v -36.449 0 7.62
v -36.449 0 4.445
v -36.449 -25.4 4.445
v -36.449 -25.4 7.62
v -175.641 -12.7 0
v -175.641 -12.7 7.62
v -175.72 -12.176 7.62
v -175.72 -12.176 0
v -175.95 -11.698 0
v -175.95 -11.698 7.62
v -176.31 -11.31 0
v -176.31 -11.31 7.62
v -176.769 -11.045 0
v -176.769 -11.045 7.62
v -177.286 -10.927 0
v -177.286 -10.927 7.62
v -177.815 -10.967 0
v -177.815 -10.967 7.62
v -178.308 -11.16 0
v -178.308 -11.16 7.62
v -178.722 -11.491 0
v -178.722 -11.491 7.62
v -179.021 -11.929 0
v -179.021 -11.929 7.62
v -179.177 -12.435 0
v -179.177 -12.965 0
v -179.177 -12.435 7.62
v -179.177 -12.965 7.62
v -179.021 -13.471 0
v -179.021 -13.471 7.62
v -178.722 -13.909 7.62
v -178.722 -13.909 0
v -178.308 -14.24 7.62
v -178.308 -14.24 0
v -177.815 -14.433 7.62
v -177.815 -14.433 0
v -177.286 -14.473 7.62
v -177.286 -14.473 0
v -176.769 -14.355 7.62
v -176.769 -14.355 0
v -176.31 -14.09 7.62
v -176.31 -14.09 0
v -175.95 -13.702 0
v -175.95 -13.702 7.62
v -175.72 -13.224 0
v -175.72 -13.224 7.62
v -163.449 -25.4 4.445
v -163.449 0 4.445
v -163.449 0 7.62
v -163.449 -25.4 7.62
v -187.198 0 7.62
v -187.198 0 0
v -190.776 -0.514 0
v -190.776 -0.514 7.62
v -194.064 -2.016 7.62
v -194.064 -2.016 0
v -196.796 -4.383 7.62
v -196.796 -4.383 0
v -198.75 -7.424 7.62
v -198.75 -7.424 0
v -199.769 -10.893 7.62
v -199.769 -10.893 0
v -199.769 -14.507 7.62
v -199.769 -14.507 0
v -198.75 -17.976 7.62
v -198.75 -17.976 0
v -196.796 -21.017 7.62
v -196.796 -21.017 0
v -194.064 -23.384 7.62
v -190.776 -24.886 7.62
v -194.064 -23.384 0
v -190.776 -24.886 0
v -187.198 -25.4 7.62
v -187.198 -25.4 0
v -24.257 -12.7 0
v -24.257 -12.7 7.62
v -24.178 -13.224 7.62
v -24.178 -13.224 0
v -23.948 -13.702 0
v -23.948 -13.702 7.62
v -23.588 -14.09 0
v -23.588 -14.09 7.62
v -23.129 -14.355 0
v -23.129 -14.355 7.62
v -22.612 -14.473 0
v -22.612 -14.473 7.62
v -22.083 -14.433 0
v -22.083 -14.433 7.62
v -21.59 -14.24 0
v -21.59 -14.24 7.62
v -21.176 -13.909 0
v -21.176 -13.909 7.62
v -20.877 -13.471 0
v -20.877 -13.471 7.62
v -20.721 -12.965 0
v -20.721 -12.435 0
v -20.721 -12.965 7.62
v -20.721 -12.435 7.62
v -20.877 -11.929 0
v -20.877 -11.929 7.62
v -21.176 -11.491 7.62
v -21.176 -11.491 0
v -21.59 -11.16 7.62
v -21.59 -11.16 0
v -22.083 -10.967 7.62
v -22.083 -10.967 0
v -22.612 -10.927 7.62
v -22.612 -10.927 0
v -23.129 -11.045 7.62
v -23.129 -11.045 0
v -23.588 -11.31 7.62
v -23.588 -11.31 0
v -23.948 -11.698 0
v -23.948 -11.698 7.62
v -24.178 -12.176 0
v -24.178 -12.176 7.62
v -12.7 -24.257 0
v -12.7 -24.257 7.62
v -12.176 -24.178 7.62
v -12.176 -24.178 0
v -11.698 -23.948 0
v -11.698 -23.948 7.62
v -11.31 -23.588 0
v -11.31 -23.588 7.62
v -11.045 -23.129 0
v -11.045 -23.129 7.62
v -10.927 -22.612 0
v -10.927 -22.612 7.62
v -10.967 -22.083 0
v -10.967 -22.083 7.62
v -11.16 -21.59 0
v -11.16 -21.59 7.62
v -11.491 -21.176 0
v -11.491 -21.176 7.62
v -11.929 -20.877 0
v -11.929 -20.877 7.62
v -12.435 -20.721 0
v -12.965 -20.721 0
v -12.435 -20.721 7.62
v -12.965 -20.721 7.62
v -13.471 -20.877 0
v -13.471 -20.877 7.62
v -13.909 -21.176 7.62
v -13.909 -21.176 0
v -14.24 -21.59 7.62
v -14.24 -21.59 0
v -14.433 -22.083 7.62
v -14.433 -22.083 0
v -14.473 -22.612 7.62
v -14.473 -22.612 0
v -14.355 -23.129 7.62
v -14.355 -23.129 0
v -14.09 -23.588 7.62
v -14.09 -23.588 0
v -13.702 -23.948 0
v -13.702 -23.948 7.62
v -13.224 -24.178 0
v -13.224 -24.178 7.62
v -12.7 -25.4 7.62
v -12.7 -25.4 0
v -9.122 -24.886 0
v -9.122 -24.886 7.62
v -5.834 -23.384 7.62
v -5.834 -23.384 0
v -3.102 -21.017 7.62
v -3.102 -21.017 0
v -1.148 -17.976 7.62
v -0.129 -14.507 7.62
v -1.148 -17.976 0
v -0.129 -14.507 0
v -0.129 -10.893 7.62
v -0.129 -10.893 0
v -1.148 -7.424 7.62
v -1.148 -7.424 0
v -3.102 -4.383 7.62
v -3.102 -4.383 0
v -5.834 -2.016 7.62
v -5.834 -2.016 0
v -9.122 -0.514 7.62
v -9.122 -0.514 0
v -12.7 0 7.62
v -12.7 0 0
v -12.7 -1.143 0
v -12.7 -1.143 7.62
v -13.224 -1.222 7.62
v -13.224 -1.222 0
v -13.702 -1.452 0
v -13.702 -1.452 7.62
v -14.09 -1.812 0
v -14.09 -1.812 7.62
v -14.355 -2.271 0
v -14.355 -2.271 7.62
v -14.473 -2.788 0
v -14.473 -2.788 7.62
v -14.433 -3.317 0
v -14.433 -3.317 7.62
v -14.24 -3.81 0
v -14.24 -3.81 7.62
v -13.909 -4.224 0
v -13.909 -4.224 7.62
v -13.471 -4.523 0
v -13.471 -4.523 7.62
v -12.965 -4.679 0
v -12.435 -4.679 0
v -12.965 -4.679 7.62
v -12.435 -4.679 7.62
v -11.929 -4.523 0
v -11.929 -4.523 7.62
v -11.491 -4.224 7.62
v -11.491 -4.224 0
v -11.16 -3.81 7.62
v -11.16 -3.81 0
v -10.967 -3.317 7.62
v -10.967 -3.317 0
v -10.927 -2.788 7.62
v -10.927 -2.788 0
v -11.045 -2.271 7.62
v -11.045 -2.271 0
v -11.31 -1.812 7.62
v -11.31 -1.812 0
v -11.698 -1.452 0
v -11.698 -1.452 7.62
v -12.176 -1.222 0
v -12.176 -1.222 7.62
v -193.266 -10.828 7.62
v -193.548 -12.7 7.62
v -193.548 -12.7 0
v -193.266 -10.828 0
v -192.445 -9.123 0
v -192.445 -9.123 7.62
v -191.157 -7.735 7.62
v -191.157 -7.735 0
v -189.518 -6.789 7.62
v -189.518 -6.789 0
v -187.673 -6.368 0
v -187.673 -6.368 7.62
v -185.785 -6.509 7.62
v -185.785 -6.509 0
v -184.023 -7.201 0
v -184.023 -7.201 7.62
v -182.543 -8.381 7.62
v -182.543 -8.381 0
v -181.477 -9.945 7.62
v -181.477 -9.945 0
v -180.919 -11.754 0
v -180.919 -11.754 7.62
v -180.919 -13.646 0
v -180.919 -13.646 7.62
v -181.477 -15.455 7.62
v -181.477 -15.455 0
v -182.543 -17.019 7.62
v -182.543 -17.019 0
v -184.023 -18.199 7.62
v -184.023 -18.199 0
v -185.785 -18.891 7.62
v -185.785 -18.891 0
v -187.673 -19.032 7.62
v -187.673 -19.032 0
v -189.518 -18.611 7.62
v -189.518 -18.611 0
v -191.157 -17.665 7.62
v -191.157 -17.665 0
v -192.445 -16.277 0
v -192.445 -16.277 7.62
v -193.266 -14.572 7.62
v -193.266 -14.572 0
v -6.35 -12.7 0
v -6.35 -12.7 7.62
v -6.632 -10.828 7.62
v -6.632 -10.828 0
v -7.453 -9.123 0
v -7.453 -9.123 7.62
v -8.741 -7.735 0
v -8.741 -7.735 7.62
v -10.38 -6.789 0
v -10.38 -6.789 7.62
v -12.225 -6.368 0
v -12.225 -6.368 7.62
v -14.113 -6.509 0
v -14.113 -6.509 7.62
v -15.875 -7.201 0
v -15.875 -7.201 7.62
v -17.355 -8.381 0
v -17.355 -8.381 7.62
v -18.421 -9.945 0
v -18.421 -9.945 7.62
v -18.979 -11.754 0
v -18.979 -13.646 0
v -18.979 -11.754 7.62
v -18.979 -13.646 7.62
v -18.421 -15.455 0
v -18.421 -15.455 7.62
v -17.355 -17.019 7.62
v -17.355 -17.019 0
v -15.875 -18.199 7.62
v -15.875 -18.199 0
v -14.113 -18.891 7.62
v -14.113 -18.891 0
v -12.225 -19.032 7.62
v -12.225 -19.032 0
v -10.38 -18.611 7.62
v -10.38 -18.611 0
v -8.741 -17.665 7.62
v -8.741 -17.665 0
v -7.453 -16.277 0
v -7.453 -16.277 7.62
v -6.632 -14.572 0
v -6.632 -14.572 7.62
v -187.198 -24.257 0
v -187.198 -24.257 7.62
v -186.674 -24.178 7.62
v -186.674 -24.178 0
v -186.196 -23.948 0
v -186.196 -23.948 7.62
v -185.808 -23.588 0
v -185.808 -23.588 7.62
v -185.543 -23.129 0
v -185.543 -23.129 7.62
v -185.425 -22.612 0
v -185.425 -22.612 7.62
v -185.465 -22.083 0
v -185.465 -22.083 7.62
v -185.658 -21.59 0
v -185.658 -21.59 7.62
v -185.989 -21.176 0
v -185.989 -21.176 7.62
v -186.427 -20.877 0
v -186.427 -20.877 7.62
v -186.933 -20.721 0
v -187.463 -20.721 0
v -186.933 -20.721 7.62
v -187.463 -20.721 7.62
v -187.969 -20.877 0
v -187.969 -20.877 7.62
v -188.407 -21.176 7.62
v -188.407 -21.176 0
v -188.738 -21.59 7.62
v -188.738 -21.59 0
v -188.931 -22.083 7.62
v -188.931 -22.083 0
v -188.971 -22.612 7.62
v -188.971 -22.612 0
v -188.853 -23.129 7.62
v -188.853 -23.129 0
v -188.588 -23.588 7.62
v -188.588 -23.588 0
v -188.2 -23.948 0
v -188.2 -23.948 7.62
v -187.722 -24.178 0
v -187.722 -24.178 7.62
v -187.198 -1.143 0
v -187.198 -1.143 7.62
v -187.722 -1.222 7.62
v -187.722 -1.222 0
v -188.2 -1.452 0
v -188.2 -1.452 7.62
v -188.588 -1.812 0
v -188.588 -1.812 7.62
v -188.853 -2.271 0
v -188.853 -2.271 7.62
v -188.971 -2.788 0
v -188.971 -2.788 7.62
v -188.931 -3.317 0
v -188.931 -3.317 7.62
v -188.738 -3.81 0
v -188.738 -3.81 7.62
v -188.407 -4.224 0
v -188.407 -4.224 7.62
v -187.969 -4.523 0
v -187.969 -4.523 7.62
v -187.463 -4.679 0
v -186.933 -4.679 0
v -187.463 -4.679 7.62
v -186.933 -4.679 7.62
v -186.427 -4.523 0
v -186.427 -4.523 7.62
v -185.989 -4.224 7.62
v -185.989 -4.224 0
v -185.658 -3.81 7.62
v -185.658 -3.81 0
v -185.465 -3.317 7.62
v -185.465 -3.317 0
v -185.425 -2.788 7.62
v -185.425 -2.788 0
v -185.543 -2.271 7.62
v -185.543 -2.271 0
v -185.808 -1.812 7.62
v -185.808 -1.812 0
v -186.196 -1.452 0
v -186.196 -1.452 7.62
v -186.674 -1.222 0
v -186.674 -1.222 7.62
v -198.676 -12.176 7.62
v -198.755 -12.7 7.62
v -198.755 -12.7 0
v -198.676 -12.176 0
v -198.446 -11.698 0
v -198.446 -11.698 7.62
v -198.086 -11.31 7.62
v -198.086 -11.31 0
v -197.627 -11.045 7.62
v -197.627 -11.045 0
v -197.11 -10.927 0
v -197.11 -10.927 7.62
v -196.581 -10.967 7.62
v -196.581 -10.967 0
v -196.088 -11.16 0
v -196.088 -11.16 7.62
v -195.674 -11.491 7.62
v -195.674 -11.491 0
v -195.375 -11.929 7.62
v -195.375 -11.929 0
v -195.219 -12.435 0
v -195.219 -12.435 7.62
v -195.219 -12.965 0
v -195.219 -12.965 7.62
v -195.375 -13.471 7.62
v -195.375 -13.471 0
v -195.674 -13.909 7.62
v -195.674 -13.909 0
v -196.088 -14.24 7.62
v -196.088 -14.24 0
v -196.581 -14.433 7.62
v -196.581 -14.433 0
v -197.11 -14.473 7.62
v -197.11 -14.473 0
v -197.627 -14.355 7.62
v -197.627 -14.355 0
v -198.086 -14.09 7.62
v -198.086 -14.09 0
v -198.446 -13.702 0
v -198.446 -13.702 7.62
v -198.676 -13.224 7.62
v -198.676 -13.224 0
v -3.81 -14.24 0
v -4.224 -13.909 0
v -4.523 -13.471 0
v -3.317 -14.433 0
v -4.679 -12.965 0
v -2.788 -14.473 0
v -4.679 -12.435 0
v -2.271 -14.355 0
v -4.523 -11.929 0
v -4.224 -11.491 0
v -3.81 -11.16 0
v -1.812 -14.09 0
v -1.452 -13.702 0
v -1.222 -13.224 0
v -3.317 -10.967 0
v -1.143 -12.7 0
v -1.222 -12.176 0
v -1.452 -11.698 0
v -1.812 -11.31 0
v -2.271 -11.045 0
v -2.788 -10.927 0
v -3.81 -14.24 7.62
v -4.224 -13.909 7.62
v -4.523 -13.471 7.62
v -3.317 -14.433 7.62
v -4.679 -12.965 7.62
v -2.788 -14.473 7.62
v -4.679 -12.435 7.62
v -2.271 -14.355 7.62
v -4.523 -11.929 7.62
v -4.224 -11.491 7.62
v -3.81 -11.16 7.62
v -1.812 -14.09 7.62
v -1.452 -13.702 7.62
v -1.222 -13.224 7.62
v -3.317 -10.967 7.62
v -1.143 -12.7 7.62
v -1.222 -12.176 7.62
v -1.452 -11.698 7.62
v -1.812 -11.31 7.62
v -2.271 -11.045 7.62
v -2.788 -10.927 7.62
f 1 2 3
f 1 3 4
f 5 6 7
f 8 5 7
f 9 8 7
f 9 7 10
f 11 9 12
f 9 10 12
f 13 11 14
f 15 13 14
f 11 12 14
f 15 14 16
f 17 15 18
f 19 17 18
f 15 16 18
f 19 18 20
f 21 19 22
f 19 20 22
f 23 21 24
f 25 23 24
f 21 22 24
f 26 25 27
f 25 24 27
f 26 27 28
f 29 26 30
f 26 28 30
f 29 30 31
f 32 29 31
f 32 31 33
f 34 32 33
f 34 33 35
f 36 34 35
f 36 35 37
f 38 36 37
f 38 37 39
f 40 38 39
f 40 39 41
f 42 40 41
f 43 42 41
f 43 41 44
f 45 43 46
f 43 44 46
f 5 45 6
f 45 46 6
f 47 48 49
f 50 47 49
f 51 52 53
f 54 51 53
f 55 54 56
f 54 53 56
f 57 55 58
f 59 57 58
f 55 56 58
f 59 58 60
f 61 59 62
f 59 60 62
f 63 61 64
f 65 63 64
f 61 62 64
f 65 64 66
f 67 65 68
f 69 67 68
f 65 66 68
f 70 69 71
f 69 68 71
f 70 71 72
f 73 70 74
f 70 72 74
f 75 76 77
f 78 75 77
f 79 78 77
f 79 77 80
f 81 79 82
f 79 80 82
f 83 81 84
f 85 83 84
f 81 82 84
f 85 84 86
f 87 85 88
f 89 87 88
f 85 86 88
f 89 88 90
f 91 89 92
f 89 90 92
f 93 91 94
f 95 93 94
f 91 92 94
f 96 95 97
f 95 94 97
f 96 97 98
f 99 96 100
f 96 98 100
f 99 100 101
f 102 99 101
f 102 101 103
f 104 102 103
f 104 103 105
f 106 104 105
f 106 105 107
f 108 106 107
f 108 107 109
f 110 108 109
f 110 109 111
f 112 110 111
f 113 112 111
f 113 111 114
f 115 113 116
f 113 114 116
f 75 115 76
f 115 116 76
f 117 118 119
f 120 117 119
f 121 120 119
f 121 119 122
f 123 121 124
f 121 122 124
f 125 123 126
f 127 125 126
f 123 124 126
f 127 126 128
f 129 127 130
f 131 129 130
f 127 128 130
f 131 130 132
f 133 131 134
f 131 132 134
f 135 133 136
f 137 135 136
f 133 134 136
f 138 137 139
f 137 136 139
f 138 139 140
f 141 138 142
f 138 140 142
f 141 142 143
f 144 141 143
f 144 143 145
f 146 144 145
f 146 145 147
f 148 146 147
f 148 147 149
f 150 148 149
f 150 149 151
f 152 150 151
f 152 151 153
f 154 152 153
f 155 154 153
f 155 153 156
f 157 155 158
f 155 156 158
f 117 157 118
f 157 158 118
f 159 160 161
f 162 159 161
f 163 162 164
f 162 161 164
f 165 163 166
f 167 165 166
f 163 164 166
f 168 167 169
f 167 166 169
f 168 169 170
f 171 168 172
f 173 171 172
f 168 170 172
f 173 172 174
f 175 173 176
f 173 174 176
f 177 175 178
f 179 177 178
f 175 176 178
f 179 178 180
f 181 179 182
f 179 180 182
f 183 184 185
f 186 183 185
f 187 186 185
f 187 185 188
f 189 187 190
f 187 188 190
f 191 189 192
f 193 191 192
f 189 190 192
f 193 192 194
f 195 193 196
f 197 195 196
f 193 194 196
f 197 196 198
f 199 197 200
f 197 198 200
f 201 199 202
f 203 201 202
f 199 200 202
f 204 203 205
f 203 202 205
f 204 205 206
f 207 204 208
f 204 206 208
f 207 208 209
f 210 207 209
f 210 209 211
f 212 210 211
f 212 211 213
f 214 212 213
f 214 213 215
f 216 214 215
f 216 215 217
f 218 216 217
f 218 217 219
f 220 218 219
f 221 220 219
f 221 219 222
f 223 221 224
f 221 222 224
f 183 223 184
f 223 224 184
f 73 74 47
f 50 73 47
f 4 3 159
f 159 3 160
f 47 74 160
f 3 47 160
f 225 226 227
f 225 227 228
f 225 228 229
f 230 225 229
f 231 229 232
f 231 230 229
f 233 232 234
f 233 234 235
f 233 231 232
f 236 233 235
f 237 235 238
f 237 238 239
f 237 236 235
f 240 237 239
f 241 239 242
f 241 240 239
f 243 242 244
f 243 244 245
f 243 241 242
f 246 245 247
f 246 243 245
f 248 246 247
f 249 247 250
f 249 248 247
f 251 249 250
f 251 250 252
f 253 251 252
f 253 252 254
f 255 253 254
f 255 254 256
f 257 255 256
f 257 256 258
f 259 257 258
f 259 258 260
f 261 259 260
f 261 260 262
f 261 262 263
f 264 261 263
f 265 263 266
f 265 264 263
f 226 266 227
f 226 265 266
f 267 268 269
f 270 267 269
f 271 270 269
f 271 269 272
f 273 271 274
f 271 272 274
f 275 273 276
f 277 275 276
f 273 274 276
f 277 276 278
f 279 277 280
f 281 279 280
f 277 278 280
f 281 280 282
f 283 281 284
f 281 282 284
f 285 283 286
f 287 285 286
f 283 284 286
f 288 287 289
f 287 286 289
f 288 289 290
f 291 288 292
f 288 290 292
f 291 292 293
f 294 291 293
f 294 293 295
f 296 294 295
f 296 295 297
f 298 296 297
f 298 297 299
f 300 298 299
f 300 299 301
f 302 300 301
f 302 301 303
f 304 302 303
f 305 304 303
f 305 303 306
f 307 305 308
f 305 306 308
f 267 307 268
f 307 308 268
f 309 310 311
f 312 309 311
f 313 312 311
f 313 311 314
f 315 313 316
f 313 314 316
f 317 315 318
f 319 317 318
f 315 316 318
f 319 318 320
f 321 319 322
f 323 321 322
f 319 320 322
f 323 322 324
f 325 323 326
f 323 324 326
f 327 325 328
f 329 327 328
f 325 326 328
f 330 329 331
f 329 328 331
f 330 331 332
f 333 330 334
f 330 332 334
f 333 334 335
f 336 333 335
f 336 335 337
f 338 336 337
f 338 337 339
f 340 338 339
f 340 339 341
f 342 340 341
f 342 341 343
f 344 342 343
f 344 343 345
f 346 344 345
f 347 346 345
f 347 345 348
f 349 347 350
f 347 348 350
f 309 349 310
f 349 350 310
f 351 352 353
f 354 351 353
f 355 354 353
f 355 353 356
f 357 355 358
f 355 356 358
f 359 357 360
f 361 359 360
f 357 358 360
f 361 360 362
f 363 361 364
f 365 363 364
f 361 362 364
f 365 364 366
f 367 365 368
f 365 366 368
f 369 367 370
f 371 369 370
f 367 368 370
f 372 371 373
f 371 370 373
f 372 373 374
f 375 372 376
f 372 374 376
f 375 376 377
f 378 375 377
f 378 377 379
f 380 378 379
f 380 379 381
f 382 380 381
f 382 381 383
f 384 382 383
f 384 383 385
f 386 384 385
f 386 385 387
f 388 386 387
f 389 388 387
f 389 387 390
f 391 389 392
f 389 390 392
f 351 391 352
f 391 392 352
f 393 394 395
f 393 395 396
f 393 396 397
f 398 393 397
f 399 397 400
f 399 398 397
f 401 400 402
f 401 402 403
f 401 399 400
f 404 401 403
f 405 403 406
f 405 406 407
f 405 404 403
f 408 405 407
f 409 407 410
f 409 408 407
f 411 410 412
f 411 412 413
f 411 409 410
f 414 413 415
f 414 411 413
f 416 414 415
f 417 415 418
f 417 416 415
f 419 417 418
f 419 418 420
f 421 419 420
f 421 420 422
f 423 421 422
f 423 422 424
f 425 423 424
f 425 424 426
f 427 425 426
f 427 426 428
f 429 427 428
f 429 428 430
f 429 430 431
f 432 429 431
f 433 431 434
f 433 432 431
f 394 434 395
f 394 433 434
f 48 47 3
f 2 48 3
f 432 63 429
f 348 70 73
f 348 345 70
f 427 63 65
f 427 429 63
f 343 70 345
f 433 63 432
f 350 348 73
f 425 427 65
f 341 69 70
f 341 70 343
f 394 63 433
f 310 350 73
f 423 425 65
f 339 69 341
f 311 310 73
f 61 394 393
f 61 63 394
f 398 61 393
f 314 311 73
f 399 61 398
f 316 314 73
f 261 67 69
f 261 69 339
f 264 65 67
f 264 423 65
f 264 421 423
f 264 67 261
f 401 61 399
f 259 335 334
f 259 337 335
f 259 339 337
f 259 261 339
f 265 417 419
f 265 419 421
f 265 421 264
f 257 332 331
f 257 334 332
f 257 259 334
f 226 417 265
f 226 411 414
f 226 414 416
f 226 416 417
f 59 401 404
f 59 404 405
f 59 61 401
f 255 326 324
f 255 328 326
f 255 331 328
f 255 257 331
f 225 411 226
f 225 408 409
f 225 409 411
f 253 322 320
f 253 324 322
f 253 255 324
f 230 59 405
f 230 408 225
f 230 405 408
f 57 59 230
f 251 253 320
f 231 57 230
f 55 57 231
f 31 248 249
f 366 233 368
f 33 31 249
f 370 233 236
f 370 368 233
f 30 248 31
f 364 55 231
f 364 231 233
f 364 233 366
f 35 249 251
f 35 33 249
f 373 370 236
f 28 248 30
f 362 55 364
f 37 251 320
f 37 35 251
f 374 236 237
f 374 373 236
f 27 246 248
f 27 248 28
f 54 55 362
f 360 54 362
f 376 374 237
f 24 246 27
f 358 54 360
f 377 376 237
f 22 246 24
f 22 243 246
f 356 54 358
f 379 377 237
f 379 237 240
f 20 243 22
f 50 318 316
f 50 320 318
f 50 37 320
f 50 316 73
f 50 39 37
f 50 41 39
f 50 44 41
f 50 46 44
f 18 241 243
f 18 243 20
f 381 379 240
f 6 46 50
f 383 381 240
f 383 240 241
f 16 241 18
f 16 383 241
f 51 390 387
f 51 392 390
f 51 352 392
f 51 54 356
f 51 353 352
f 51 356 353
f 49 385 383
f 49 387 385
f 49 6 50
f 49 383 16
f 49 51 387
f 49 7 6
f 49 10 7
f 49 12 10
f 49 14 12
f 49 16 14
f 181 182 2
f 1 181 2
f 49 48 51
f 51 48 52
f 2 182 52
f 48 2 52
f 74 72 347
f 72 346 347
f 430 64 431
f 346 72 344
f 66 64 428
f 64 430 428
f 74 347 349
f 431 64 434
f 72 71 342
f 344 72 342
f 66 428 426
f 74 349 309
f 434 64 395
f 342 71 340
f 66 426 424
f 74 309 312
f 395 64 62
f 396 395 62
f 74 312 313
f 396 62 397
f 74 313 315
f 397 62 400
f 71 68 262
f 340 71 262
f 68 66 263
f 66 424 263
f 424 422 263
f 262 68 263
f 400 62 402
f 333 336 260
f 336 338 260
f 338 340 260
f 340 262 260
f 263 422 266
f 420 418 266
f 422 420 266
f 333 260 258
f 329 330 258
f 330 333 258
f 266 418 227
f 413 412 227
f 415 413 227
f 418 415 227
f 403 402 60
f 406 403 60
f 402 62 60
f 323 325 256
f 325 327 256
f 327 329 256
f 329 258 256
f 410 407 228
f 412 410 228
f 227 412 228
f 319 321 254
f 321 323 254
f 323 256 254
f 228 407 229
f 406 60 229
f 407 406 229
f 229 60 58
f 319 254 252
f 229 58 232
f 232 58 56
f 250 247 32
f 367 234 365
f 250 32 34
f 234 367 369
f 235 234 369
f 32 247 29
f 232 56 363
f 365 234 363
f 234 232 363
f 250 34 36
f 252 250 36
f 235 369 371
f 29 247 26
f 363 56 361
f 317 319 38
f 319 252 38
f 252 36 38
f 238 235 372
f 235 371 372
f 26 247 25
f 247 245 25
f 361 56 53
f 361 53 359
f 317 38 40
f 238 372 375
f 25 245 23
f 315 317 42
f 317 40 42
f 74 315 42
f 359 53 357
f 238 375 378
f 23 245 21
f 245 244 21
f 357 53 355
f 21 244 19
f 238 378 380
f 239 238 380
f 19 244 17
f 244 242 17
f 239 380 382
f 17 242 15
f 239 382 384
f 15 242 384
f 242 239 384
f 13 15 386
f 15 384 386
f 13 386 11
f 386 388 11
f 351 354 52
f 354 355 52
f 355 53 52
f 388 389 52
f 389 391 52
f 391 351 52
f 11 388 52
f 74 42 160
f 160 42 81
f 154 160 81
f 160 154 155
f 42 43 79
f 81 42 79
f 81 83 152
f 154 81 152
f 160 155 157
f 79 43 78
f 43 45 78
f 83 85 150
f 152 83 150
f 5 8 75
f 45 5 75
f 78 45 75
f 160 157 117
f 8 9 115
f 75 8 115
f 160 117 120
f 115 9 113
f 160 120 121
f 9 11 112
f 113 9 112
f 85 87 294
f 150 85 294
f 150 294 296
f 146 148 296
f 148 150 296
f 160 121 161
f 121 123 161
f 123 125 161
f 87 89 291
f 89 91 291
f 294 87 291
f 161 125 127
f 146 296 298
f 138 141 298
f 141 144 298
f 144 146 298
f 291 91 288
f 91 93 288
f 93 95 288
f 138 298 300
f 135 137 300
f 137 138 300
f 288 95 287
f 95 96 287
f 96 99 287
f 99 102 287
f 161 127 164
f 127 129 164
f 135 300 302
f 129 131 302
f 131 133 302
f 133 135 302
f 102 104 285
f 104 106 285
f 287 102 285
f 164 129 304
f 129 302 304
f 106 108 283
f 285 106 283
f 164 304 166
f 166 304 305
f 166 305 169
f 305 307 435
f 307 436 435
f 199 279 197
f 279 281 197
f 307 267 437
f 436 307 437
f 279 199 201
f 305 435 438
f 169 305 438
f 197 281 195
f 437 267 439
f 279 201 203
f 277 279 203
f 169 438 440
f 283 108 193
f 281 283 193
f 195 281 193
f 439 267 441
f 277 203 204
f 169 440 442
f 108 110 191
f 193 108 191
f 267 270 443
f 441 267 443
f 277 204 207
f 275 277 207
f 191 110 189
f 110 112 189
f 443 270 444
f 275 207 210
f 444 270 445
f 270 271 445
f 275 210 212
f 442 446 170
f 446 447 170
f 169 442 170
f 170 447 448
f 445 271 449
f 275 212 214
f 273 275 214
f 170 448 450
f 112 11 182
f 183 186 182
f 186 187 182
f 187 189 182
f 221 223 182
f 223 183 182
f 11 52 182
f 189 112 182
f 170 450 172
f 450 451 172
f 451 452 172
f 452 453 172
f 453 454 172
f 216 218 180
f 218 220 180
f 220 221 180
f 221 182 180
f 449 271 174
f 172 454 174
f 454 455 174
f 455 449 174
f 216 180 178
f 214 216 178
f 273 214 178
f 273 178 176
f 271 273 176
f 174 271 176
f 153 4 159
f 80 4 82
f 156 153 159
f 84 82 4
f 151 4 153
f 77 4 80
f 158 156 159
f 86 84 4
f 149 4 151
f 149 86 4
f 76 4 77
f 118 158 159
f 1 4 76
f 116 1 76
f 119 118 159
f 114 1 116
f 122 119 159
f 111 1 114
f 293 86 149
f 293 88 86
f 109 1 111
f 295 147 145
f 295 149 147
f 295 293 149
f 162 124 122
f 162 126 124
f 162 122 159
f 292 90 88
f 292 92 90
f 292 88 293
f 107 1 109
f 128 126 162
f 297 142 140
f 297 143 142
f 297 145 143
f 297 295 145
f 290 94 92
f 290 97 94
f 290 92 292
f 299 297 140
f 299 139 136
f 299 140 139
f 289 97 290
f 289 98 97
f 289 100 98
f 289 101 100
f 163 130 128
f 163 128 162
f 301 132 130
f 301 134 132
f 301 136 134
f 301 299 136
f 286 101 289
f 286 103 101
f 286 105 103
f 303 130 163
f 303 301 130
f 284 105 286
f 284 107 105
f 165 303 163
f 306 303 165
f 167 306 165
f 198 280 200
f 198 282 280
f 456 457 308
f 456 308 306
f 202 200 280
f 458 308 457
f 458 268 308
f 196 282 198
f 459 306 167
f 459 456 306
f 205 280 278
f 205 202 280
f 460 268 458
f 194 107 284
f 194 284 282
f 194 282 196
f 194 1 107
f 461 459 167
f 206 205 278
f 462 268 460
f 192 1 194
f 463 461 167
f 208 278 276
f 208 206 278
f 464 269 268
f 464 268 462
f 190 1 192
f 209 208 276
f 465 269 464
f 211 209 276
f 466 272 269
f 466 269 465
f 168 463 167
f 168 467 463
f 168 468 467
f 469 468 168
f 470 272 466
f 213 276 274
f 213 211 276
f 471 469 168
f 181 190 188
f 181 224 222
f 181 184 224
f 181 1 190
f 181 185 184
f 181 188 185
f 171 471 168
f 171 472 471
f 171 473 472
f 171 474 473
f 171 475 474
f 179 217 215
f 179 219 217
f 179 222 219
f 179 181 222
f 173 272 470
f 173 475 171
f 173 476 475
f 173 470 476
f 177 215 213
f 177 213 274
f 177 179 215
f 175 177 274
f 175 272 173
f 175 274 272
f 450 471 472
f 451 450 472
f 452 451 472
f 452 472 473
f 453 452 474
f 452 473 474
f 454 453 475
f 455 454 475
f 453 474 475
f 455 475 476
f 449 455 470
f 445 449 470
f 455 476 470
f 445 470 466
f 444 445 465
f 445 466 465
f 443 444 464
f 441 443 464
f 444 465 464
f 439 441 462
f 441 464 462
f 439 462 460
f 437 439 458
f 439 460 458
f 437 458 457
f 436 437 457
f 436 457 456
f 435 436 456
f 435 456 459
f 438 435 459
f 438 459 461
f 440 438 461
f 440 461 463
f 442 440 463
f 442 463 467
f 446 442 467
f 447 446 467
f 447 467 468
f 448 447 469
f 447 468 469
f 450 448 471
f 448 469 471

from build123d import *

# Parameters (mm, degrees)
SKETCH1_R               = 12.7
BOSS_EXTRUDE1_DEPTH     = 7.62
SKETCH2_R               = 6.35
CUT_EXTRUDE1_DEPTH      = 7.62
SKETCH3_R               = 1.778
CUT_EXTRUDE2_DEPTH      = 7.62
CIRPATTERN1_COUNT       = 4
MIRROR1_COPY_1_SKETCH_R = 1.778
MIRROR1_COPY_1_DEPTH    = 7.62
MIRROR1_COPY_2_SKETCH_R = 1.778
MIRROR1_COPY_2_DEPTH    = 7.62
MIRROR1_COPY_3_SKETCH_R = 1.778
MIRROR1_COPY_3_DEPTH    = 7.62
SKETCH4_W               = 127
SKETCH4_H               = 3.175
CUT_EXTRUDE3_DEPTH      = 25.4


with BuildPart() as part:
    # Sketch1 → Boss-Extrude1 (new body)
    with BuildSketch(Plane.XY):
        with BuildLine():
            ThreePointArc((-12.7, -25.4), (-25.4, -12.7), (-12.7, 0))
            Line((-12.7, 0), (-187.198, 0))
            ThreePointArc((-187.198, 0), (-178.217743879, -3.719743879), (-174.498, -12.7))
            ThreePointArc((-174.498, -12.7), (-178.217743879, -21.680256121), (-187.198, -25.4))
            Line((-187.198, -25.4), (-12.7, -25.4))
        make_face()
        with Locations((-187.198, -12.7)):
            Circle(SKETCH1_R)
        with Locations((-12.7, -12.7)):
            Circle(SKETCH1_R)
    extrude(amount=BOSS_EXTRUDE1_DEPTH)

    # Sketch2 → Cut-Extrude1 (cut)
    with BuildSketch(Plane.XY.offset(7.62)):
        with Locations((-12.7, -12.7)):
            Circle(SKETCH2_R)
    cut_extrude1 = extrude(amount=-CUT_EXTRUDE1_DEPTH, mode=Mode.SUBTRACT)

    # Sketch3 → Cut-Extrude2 (cut)
    with BuildSketch(Plane.XY.offset(7.62)):
        with Locations((-2.921, -12.7)):
            Circle(SKETCH3_R)
    cut_extrude2 = extrude(amount=-CUT_EXTRUDE2_DEPTH, mode=Mode.SUBTRACT)

    # CirPattern1: Cut-Extrude2 ×4 about axis
    cirpattern1_axis = Axis((-12.7, -12.7, 0), (0, 0, 1))
    for i in range(1, CIRPATTERN1_COUNT):
        add(cut_extrude2.rotate(cirpattern1_axis, i * 360 / CIRPATTERN1_COUNT), mode=Mode.SUBTRACT)

    # Mirror1: Cut-Extrude1, Cut-Extrude2 across plane
    add(cut_extrude1.mirror(Plane(origin=(-99.949, 0, 0), x_dir=(0, 0, 1), z_dir=(1, 0, 0))), mode=Mode.SUBTRACT)
    add(cut_extrude2.mirror(Plane(origin=(-99.949, 0, 0), x_dir=(0, 0, 1), z_dir=(1, 0, 0))), mode=Mode.SUBTRACT)

    # Mirror1 copy 1 sketch → Mirror1 copy 1 (cut)
    with BuildSketch(Plane(origin=(-174.498, 0, 7.62), x_dir=(0, 1, 0), z_dir=(0, 0, 1))):
        with Locations((-2.921, 12.7)):
            Circle(MIRROR1_COPY_1_SKETCH_R)
    extrude(amount=-MIRROR1_COPY_1_DEPTH, mode=Mode.SUBTRACT)

    # Mirror1 copy 2 sketch → Mirror1 copy 2 (cut)
    with BuildSketch(Plane(origin=(-174.498, -25.4, 7.62), x_dir=(1, 0, 0), z_dir=(0, 0, 1))):
        with Locations((-2.921, 12.7)):
            Circle(MIRROR1_COPY_2_SKETCH_R)
    extrude(amount=-MIRROR1_COPY_2_DEPTH, mode=Mode.SUBTRACT)

    # Mirror1 copy 3 sketch → Mirror1 copy 3 (cut)
    with BuildSketch(Plane(origin=(-199.898, -25.4, 7.62), x_dir=(0, -1, 0), z_dir=(0, 0, 1))):
        with Locations((-2.921, 12.7)):
            Circle(MIRROR1_COPY_3_SKETCH_R)
    extrude(amount=-MIRROR1_COPY_3_DEPTH, mode=Mode.SUBTRACT)

    # Sketch4 → Cut-Extrude3 (cut)
    with BuildSketch(Plane.XZ.offset(25.4)):
        with Locations((-99.949, 6.0325)):
            Rectangle(SKETCH4_W, SKETCH4_H)
    extrude(amount=-CUT_EXTRUDE3_DEPTH, mode=Mode.SUBTRACT)


solid = part.part
